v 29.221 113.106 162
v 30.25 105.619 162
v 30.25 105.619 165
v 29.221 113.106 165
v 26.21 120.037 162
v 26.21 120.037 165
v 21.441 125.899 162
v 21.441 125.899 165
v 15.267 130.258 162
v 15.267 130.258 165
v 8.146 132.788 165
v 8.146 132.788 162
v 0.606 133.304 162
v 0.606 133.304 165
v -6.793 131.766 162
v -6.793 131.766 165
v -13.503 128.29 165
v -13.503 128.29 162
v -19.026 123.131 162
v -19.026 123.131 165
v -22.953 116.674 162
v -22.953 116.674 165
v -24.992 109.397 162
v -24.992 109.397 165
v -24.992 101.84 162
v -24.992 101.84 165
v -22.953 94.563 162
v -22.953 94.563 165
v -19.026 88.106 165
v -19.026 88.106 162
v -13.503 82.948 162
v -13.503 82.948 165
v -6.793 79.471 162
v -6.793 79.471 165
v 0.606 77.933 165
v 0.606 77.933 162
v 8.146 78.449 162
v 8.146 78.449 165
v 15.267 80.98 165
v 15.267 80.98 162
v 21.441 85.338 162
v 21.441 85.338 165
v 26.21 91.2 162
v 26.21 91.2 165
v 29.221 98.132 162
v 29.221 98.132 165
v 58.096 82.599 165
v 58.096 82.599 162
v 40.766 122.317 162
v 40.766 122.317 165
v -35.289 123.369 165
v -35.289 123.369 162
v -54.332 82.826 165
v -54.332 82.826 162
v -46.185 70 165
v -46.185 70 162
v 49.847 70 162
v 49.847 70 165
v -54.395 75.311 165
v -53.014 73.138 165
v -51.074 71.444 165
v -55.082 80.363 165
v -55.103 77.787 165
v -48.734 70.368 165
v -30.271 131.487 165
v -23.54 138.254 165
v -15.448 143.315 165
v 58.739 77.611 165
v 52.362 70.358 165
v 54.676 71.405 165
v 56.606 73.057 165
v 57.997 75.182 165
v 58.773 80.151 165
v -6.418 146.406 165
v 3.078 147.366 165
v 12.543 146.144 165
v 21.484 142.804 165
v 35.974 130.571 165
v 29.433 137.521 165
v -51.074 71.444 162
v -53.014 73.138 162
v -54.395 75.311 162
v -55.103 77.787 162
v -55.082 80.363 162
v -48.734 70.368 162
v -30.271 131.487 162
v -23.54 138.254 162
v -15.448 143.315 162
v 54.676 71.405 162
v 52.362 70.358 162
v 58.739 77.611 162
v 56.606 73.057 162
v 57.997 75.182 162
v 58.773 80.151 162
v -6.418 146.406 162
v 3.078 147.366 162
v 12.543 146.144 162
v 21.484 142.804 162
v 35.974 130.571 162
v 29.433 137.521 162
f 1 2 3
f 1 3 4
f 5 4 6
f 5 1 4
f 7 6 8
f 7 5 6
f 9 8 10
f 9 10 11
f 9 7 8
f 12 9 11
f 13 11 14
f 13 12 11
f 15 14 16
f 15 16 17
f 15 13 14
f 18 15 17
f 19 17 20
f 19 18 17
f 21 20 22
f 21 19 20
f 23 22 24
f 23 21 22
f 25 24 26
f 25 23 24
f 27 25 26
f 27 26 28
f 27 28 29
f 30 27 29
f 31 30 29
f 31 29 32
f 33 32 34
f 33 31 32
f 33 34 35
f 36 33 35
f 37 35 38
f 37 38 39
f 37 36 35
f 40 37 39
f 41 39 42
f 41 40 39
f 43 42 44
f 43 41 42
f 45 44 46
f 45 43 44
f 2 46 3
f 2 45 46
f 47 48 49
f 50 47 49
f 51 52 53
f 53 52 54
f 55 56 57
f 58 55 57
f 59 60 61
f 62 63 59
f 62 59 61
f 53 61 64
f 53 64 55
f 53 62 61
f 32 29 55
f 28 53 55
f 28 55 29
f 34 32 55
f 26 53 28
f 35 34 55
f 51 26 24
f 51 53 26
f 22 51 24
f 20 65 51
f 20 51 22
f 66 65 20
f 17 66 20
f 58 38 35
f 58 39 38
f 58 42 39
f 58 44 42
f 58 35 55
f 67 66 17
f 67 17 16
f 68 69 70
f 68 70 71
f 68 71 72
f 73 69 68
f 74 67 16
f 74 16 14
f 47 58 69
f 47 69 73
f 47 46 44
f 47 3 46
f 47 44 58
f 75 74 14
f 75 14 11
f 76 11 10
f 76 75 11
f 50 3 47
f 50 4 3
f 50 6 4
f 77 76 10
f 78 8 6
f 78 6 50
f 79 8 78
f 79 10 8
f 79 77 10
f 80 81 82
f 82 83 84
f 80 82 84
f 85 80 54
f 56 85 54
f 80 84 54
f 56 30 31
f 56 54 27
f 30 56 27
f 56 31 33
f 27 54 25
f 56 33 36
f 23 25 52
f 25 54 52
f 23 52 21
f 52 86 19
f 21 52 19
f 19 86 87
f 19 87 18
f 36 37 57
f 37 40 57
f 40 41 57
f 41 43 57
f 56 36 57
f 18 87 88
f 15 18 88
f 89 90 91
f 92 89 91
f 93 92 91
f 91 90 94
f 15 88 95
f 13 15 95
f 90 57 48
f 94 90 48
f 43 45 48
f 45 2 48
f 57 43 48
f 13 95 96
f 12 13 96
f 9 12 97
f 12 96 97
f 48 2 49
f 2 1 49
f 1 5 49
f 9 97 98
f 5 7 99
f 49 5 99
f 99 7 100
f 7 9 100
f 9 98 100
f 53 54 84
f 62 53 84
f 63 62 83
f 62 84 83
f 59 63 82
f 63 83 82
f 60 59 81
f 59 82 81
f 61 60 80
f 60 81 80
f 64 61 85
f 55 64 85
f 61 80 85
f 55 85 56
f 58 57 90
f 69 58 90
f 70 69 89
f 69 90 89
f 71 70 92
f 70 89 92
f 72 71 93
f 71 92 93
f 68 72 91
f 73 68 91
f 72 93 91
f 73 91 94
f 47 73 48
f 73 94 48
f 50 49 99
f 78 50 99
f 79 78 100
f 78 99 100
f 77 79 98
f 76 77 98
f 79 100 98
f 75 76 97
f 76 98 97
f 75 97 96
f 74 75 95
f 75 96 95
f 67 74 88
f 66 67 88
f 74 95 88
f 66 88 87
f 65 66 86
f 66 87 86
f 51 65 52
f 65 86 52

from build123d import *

# Parameters (mm, degrees)
SKETCH1_R           = 27.75
BOSS_EXTRUDE1_DEPTH = 3


with BuildPart() as part:
    # Sketch1 → Boss-Extrude1 (new body)
    with BuildSketch(Plane.XY.offset(162)):
        with BuildLine():
            Line((-45.305021967, 70), (-20, 70))
            Line((-20, 70), (20, 70))
            Line((20, 70), (45.305021967, 70))
            Line((45.305021967, 70), (49.846930848, 70))
            ThreePointArc((49.846930848, 70), (57.376653748, 74.070165008), (58.0958845, 82.599272656))
            Line((58.0958845, 82.599272656), (40.765979439, 122.316625933))
            ThreePointArc((40.765979439, 122.316625933), (3.077668906, 147.366003385), (-35.28933022, 123.36905692))
            Line((-35.28933022, 123.36905692), (-54.331701831, 82.826144007))
            ThreePointArc((-54.331701831, 82.826144007), (-53.782712085, 74.174821043), (-46.185498909, 70))
            Line((-46.185498909, 70), (-45.305021967, 70))
        make_face()
        with Locations((2.5, 105.61875)):
            Circle(SKETCH1_R, mode=Mode.SUBTRACT)
    extrude(amount=BOSS_EXTRUDE1_DEPTH)


solid = part.part
